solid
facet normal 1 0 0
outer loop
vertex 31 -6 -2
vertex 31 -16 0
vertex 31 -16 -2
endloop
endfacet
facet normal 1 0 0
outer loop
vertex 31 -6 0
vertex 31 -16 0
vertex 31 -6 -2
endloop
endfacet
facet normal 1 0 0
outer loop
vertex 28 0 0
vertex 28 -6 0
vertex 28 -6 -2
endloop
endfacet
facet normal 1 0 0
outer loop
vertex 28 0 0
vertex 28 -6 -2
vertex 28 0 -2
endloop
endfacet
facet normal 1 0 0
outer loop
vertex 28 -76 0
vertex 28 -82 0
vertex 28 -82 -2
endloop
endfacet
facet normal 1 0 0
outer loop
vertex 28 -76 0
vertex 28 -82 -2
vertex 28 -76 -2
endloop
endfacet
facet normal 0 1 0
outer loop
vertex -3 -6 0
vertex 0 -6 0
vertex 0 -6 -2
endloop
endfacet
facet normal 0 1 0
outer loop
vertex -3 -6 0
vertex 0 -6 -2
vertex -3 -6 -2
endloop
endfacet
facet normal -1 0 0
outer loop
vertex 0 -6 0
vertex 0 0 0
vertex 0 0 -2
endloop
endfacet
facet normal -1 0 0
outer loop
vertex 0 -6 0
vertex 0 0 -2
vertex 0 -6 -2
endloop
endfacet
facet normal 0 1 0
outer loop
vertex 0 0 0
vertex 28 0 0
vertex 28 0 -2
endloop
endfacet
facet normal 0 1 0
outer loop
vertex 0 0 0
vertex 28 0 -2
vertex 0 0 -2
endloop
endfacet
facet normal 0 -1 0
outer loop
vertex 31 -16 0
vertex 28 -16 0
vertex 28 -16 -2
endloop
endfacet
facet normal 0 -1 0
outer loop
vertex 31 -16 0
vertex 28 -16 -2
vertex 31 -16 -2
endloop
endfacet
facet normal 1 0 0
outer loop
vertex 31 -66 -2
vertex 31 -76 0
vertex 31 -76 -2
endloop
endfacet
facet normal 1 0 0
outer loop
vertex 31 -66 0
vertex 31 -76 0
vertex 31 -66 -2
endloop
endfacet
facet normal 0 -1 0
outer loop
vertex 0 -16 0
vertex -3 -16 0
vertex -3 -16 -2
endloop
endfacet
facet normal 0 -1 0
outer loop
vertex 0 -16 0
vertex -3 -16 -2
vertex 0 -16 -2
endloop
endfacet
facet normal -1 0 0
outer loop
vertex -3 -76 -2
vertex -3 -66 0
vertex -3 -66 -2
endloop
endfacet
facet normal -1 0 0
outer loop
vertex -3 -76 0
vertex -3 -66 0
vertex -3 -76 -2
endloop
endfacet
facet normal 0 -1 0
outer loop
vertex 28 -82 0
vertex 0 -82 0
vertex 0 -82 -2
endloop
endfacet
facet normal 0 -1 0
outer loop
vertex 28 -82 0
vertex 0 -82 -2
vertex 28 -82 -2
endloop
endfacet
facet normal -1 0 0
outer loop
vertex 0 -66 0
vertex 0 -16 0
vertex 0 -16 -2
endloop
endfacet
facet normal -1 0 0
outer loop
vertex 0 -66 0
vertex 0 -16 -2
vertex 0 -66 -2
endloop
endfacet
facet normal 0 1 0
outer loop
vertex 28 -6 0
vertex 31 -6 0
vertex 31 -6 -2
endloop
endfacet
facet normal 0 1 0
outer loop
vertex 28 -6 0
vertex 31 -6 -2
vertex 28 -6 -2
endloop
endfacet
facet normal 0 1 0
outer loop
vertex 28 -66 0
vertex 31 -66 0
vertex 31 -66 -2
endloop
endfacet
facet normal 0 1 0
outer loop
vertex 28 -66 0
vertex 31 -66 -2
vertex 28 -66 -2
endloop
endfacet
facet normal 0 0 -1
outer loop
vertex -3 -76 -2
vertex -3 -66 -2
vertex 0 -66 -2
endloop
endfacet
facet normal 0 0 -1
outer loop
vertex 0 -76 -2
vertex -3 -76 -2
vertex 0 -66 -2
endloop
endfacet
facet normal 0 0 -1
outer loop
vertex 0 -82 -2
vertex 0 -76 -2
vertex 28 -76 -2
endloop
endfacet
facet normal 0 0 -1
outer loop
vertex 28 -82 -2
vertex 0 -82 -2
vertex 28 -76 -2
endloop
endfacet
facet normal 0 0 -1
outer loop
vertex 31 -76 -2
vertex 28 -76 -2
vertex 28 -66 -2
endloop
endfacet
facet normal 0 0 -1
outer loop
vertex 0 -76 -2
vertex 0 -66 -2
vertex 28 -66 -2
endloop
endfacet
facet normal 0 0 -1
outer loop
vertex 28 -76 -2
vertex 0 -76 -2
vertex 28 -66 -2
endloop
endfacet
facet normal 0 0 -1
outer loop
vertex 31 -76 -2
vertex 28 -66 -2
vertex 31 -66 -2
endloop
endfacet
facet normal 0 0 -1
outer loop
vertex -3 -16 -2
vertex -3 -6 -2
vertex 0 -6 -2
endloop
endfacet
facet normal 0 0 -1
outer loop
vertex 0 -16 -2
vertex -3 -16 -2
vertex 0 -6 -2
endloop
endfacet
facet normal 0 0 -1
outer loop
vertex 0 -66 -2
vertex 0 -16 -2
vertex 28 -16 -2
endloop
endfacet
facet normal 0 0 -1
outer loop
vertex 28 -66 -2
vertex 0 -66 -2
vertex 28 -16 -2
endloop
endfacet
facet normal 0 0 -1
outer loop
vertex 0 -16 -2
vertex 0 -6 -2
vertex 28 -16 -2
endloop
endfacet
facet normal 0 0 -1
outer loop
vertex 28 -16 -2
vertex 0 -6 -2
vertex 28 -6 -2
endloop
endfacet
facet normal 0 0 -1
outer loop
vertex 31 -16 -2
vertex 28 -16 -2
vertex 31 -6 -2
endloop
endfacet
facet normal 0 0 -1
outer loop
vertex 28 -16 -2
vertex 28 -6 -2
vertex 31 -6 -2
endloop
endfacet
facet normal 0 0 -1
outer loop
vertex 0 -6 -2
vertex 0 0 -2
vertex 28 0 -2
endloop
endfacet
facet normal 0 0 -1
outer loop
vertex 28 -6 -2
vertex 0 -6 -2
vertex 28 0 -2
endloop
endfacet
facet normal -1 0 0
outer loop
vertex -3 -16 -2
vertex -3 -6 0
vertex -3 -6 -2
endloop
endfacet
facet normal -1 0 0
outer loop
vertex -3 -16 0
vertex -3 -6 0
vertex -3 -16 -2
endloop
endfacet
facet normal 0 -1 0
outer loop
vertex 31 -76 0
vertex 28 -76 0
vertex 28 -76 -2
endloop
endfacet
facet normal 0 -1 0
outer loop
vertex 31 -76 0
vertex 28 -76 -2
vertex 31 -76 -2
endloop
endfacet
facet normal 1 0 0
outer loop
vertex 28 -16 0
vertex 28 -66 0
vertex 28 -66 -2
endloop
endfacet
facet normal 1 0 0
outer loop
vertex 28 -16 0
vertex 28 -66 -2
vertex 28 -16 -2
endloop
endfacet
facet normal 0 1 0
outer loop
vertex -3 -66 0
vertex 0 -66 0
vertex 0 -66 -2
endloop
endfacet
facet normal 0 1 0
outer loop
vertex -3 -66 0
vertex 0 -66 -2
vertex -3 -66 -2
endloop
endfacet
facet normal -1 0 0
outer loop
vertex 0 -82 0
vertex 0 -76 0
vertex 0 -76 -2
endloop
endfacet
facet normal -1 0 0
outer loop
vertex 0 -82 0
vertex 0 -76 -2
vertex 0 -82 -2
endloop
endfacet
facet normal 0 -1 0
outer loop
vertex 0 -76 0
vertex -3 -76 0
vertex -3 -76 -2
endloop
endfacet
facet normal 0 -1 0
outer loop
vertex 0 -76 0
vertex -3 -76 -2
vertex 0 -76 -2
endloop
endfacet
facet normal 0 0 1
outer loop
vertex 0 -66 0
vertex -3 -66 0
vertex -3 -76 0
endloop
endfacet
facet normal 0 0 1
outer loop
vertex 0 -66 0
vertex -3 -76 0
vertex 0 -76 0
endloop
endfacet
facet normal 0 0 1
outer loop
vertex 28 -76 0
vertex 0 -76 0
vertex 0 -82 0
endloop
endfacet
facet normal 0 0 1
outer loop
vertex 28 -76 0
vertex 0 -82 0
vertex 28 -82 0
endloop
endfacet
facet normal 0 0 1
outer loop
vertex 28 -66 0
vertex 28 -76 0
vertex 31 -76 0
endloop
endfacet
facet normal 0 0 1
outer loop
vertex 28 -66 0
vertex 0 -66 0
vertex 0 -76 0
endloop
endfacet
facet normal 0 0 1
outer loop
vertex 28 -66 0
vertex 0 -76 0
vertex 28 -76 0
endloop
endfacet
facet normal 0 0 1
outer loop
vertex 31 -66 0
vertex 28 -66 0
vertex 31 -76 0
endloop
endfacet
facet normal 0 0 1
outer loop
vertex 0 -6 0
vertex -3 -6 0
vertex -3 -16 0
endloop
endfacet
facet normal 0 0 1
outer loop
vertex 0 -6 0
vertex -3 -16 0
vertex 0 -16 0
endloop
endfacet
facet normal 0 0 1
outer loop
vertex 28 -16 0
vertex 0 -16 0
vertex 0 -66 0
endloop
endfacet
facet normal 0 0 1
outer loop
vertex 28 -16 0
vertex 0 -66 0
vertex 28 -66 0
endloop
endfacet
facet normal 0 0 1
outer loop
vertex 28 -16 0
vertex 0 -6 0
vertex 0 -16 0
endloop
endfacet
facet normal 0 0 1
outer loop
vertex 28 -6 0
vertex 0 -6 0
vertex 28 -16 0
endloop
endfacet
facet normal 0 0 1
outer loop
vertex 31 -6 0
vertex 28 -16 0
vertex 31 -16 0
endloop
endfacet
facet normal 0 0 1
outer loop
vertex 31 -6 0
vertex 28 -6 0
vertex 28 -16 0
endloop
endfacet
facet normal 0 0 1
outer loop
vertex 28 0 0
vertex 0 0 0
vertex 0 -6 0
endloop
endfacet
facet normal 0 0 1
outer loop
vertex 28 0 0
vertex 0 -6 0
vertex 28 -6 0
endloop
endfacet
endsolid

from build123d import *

# Parameters (mm, degrees)
SALIENTE_EXTRUIR1_DEPTH = 2


with BuildPart() as part:
    # Croquis1 → Saliente-Extruir1 (new body)
    with BuildSketch(Plane.XY):
        Polygon((0, 0), (0, -6), (-3, -6), (-3, -16), (0, -16), (0, -66), (-3, -66), (-3, -76), (0, -76), (0, -82), (28, -82), (28, -76), (31, -76), (31, -66), (28, -66), (28, -16), (31, -16), (31, -6), (28, -6), (28, 0), align=None)
    extrude(amount=-SALIENTE_EXTRUIR1_DEPTH)


solid = part.part
